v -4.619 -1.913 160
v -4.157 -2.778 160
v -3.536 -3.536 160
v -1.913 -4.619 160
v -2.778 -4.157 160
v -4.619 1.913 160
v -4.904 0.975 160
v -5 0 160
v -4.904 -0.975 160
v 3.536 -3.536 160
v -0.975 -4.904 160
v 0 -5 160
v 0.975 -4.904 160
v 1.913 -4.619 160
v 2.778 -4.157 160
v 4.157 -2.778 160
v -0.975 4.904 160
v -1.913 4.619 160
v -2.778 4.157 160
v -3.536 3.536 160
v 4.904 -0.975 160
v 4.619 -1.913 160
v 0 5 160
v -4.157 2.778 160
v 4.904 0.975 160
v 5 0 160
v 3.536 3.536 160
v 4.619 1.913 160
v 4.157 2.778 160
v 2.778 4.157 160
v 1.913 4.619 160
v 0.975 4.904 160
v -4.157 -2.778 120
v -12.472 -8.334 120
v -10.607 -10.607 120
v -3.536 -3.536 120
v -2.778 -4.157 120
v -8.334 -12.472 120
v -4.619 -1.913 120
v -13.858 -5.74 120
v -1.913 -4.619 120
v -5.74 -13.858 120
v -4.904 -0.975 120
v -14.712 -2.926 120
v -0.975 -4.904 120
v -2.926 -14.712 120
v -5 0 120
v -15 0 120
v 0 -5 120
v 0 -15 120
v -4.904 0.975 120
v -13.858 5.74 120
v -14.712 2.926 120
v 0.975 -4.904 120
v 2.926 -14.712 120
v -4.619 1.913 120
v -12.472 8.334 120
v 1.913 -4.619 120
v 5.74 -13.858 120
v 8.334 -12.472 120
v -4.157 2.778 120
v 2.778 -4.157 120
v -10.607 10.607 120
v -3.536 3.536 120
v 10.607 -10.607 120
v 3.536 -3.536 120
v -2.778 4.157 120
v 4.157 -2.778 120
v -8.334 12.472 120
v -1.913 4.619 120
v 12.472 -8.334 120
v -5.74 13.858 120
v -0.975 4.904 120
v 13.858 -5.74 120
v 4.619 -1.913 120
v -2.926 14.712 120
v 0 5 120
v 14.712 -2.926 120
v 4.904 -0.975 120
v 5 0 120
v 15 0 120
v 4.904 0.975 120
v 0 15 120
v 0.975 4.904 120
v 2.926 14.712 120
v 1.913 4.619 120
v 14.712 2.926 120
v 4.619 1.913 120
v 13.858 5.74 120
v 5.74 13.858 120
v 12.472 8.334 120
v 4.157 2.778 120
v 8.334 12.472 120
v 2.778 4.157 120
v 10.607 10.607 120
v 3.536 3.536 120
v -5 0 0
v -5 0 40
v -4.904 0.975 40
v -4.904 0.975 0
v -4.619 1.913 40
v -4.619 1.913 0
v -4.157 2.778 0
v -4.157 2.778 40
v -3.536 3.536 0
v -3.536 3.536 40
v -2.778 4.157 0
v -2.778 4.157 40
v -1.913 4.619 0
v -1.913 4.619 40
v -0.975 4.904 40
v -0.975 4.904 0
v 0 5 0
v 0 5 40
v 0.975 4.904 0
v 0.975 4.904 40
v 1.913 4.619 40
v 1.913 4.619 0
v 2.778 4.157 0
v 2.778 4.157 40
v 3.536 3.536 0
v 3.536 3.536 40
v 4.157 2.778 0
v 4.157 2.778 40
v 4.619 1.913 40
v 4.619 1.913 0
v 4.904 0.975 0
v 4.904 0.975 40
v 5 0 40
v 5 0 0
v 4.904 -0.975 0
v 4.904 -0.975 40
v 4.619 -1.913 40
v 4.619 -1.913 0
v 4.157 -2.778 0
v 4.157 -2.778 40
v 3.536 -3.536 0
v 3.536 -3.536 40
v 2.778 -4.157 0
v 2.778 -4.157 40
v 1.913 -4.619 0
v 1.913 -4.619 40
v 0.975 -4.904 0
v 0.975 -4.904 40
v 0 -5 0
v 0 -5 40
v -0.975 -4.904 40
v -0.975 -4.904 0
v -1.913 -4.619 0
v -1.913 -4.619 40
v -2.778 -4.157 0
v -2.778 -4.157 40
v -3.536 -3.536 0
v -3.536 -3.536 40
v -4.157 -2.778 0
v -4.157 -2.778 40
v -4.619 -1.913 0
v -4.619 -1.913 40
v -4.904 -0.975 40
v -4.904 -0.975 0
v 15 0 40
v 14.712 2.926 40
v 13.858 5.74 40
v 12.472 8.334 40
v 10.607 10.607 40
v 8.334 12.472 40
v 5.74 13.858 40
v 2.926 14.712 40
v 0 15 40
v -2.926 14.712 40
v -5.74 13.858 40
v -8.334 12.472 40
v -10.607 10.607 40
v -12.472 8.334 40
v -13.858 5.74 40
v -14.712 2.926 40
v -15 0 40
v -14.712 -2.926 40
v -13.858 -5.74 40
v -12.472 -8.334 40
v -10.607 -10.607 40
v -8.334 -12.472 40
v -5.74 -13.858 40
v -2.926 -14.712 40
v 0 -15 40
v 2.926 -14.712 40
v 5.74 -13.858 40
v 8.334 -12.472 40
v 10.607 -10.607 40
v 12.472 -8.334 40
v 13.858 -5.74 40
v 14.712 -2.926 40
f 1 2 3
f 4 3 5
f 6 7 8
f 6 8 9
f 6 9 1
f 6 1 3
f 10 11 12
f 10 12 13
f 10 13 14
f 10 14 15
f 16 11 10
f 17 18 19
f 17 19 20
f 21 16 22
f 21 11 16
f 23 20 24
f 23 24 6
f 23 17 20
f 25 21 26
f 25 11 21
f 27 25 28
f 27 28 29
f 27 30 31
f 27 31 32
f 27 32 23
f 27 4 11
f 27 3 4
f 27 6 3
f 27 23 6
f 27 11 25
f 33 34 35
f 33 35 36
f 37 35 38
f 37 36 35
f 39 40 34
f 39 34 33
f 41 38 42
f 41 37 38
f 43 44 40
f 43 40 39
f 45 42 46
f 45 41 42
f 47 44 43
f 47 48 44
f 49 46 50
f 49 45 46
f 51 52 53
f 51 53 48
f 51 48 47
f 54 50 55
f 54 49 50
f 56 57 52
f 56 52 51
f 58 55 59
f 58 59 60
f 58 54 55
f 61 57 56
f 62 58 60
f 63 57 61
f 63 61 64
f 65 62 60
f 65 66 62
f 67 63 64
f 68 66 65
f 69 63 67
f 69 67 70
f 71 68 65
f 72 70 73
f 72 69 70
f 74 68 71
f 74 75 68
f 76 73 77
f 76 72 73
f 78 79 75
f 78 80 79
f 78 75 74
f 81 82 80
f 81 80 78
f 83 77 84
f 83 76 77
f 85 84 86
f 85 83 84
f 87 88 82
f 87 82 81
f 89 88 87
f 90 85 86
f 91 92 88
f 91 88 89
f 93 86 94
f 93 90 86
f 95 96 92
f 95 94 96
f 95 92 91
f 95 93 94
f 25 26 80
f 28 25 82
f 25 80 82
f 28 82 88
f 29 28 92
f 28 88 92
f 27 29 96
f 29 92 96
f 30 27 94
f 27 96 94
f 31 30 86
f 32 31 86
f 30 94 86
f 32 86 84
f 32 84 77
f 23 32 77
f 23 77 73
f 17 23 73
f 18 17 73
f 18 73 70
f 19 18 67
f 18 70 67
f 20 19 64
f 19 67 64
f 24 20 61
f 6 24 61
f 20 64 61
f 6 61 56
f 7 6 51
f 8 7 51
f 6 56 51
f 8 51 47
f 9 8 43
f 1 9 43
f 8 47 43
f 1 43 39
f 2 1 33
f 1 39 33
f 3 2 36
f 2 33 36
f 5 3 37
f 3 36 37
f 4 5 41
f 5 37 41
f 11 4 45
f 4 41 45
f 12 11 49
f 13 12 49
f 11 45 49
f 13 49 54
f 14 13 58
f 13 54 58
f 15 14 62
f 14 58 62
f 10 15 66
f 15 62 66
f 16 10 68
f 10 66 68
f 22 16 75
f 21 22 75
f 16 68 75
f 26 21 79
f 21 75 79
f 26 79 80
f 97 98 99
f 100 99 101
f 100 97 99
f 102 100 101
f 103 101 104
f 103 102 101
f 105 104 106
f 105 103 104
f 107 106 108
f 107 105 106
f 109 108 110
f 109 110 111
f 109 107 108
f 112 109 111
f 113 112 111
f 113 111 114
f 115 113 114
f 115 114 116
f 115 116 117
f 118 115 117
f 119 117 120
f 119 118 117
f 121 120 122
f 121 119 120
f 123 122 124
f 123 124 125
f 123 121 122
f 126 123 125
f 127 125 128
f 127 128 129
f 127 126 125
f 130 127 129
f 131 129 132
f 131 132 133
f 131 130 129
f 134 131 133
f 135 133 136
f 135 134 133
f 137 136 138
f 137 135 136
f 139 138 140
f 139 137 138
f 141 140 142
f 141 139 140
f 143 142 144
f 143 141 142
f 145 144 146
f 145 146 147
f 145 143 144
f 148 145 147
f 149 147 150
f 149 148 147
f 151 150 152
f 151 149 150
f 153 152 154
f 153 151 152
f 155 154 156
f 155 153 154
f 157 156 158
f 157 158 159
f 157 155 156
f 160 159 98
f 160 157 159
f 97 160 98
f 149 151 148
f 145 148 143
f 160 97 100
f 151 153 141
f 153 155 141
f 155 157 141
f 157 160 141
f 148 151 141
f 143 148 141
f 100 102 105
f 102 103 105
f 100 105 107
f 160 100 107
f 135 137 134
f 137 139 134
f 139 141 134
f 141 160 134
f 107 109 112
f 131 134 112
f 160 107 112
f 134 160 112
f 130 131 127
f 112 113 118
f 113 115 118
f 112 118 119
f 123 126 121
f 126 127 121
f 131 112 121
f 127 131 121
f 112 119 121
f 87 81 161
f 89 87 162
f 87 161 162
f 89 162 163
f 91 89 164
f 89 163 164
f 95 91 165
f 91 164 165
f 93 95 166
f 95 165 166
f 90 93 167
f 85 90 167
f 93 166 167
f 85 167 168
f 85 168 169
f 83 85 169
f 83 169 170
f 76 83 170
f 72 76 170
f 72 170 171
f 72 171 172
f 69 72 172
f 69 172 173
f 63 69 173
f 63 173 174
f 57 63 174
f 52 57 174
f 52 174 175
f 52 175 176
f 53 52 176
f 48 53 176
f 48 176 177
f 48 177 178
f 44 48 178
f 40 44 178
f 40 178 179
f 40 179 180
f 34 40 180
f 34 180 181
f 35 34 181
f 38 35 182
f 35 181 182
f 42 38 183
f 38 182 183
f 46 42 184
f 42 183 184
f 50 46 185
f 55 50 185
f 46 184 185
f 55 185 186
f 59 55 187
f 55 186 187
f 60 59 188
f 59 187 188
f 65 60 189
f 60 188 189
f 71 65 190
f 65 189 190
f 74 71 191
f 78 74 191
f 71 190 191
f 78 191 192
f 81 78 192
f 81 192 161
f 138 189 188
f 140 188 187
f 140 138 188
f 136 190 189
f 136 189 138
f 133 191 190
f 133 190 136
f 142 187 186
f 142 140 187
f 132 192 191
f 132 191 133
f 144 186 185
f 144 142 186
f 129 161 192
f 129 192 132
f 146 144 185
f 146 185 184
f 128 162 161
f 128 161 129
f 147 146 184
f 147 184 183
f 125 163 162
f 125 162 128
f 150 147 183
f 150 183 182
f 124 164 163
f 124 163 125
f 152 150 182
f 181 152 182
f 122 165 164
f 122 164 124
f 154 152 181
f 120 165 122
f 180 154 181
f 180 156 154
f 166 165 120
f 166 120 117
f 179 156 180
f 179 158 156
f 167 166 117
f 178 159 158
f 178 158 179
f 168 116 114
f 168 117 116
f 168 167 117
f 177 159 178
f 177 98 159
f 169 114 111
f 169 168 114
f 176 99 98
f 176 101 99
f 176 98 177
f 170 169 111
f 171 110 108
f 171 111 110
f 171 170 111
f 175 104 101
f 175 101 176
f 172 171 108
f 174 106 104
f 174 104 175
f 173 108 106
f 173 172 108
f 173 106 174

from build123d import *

# Parameters (mm, degrees)
CROQUIS1_R                   = 15
SALIENTE_EXTRUIR1_DEPTH      = 160
CROQUIS2_R                   = 15
CROQUIS2_R_2                 = 5
CORTAR_EXTRUIR_L_MINA1_DEPTH = 40
CORTAR_EXTRUIR_L_MINA2_START = -40
CROQUIS3_R                   = 15
CROQUIS3_R_2                 = 5
CORTAR_EXTRUIR_L_MINA2_DEPTH = 40


with BuildPart() as part:
    # Croquis1 → Saliente-Extruir1 (new body)
    with BuildSketch(Plane.XY):
        Circle(CROQUIS1_R)
    extrude(amount=SALIENTE_EXTRUIR1_DEPTH)

    # Croquis2 → Cortar-Extruir-Lámina1 (cut)
    with BuildSketch(Plane(origin=(0, 0, 0), x_dir=(-1, 0, 0), z_dir=(0, 0, -1))):
        Circle(CROQUIS2_R)
        Circle(CROQUIS2_R_2, mode=Mode.SUBTRACT)
    extrude(amount=-CORTAR_EXTRUIR_L_MINA1_DEPTH, mode=Mode.SUBTRACT)

    # Croquis3 → Cortar-Extruir-Lámina2 (cut)
    with BuildSketch(Plane.XY.offset(160).offset(CORTAR_EXTRUIR_L_MINA2_START)):
        Circle(CROQUIS3_R)
        Circle(CROQUIS3_R_2, mode=Mode.SUBTRACT)
    extrude(amount=CORTAR_EXTRUIR_L_MINA2_DEPTH, mode=Mode.SUBTRACT)


solid = part.part
